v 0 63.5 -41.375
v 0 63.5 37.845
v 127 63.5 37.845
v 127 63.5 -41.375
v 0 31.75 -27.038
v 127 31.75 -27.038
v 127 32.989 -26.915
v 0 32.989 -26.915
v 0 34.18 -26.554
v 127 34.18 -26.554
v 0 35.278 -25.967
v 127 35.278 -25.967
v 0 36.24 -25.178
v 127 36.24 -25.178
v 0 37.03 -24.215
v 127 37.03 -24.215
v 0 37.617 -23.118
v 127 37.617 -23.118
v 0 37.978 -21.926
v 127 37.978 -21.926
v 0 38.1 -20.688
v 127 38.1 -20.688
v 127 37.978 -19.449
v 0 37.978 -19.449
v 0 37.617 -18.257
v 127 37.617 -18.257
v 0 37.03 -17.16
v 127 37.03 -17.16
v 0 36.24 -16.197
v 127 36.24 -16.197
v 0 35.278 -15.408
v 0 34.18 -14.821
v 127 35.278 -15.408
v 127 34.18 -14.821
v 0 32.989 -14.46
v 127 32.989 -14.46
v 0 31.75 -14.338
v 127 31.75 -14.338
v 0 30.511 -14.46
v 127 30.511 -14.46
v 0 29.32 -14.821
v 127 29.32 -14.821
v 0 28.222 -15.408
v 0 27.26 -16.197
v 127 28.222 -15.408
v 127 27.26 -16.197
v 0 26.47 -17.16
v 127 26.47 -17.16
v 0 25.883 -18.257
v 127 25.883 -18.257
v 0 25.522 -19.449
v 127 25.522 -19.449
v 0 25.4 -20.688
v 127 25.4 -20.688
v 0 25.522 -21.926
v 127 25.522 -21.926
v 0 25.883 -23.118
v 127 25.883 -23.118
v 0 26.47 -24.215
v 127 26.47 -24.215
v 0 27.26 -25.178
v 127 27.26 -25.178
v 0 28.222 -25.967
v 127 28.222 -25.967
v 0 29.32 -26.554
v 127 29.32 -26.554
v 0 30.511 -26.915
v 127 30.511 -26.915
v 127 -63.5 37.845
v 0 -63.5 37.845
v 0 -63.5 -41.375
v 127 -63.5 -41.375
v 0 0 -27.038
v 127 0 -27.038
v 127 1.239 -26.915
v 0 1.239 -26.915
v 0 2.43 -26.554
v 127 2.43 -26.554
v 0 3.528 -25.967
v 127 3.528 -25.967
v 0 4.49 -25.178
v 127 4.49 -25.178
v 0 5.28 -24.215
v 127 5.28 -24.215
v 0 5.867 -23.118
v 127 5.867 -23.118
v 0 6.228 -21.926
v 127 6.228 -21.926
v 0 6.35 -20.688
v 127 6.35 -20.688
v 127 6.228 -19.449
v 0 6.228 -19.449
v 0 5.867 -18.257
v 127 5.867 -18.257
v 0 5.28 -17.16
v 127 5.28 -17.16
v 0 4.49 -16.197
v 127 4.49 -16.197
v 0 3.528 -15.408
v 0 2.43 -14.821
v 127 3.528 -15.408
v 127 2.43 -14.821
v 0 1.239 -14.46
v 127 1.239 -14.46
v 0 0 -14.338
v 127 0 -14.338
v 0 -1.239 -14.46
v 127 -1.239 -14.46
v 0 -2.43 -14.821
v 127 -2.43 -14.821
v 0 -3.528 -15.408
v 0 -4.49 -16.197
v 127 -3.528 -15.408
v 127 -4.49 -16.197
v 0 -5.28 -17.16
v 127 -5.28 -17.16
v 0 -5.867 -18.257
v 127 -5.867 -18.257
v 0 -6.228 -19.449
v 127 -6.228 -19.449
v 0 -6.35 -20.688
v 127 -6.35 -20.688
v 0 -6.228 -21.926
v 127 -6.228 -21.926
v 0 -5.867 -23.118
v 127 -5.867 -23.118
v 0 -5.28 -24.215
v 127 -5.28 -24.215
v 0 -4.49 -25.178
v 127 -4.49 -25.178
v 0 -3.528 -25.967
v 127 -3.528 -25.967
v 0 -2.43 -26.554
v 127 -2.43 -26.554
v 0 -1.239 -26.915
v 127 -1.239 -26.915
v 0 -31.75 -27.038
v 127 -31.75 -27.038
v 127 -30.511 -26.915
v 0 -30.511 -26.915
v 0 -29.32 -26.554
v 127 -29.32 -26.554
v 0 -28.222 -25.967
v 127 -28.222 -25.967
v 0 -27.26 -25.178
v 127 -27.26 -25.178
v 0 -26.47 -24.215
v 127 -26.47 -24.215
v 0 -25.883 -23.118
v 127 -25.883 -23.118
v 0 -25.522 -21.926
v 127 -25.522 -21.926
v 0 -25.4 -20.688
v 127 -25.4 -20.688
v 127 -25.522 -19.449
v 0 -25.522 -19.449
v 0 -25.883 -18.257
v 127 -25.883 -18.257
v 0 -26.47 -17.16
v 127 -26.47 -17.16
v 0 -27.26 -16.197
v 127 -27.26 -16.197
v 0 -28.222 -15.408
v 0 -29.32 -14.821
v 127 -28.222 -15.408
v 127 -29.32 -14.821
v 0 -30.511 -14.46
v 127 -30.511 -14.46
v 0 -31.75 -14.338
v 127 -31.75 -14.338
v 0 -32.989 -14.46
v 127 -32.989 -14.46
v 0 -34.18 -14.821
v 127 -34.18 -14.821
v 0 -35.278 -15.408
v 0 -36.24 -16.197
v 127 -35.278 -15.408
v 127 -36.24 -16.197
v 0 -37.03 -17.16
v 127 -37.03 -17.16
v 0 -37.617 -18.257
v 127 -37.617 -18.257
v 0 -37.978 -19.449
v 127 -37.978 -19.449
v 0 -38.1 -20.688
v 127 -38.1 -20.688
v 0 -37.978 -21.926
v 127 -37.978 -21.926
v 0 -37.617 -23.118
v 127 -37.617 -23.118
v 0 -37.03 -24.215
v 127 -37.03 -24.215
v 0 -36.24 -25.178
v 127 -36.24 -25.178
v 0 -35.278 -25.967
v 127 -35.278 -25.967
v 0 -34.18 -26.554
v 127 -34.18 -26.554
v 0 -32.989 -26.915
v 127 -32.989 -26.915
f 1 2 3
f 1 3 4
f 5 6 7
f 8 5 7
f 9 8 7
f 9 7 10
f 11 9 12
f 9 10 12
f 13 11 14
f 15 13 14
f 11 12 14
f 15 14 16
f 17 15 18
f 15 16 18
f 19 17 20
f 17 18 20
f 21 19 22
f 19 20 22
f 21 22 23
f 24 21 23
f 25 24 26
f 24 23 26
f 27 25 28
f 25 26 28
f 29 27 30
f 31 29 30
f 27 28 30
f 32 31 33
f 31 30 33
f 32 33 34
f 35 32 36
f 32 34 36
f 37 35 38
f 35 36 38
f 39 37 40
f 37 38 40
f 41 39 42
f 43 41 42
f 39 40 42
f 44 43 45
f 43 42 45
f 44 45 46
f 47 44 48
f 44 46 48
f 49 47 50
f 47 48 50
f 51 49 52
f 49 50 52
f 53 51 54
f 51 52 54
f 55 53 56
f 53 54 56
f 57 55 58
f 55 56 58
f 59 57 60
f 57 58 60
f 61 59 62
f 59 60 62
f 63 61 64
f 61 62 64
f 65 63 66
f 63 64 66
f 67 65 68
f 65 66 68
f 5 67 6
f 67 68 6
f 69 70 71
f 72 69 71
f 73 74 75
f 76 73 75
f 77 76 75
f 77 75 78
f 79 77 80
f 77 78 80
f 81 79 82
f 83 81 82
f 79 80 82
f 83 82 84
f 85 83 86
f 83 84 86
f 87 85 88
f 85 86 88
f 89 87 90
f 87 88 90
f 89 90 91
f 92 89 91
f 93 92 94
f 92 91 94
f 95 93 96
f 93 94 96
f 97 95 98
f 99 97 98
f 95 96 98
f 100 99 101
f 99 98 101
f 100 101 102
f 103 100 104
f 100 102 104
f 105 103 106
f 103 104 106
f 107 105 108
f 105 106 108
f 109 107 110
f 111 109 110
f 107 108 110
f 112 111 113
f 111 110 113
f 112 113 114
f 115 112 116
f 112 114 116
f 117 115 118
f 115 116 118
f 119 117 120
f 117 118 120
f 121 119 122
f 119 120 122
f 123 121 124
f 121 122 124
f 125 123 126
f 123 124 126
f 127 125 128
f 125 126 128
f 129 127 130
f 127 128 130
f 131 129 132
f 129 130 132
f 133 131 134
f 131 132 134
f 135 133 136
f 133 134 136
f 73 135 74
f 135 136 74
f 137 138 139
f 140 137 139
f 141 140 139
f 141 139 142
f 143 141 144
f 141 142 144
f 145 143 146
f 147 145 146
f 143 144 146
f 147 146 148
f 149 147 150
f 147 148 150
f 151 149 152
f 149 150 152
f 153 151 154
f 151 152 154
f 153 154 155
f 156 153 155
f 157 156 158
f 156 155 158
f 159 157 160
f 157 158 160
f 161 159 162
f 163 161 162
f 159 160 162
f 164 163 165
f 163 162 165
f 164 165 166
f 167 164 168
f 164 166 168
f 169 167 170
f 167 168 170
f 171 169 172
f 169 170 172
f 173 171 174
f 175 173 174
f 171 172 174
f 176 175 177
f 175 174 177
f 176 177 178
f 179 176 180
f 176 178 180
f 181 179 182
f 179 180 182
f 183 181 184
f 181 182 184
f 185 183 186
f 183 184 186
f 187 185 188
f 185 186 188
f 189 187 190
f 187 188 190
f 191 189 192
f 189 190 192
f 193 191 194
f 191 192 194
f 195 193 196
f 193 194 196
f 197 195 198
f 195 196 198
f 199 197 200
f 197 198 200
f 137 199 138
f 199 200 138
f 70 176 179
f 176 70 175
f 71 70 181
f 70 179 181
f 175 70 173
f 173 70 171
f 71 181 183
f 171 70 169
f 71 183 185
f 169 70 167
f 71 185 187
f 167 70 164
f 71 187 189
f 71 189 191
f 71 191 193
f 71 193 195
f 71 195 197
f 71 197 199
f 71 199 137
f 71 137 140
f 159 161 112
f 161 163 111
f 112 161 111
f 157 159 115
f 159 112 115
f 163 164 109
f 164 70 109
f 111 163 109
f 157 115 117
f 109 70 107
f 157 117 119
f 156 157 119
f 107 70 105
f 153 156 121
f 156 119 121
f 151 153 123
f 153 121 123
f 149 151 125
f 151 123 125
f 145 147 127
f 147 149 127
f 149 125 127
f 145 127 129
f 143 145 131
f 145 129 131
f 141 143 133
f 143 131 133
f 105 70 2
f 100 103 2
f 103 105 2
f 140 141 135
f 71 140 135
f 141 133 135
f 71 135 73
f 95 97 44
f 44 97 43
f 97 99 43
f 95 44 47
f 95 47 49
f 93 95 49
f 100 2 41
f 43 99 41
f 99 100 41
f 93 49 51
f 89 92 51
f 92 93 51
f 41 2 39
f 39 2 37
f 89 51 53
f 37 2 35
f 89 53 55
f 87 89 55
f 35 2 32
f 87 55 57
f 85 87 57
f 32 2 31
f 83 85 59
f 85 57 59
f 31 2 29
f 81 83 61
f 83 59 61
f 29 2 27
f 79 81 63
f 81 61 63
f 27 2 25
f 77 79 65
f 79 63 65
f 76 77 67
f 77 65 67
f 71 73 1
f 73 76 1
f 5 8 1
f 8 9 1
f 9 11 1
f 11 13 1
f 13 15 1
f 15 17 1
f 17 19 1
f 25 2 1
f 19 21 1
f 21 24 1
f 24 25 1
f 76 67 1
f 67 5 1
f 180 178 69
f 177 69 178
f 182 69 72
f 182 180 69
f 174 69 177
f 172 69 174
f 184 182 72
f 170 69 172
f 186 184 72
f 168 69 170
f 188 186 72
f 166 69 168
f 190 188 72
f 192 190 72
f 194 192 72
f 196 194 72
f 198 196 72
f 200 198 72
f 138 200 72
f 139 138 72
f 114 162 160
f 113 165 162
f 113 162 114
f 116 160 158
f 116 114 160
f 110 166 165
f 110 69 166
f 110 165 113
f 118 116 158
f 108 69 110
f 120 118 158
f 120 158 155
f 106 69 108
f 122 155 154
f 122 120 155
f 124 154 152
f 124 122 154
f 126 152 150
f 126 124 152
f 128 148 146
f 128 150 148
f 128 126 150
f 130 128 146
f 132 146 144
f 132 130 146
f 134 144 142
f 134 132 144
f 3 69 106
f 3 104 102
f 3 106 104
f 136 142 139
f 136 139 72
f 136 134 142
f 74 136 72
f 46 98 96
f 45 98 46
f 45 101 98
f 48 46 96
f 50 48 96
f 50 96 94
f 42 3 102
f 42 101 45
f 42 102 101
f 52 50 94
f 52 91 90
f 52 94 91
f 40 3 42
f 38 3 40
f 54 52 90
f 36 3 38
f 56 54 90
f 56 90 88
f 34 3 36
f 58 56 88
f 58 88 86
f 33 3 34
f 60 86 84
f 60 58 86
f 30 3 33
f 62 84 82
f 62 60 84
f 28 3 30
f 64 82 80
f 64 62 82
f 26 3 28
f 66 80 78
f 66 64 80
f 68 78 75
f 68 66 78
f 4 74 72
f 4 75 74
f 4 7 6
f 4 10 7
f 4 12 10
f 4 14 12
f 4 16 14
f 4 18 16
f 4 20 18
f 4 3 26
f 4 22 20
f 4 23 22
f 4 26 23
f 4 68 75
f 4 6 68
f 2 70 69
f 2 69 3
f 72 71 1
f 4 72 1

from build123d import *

# Parameters (mm, degrees)
SKETCH1_W               = 82.75
SKETCH1_H               = 127
BOSS_EXTRUDE1_DEPTH     = 127
SKETCH2_R               = 6.35
CUT_EXTRUDE1_DEPTH      = 1
CUT_EXTRUDE1_DEPTH_BACK = 127
SKETCH3_W               = 28.753041512
SKETCH3_H               = 129.689601996
CUT_EXTRUDE2_DEPTH      = 127
SKETCH6_W               = 3.210142998
SKETCH6_H               = 200
CUT_EXTRUDE3_DEPTH      = 128


with BuildPart() as part:
    # Sketch1 → Boss-Extrude1 (new body)
    with BuildSketch(Plane(origin=(0, 0, 0), x_dir=(0, 0, -1), z_dir=(1, 0, 0))):
        Rectangle(SKETCH1_W, SKETCH1_H)
    extrude(amount=BOSS_EXTRUDE1_DEPTH)

    # Sketch2 → Cut-Extrude1 (cut, two sides)
    with BuildSketch(Plane(origin=(127, 0, 0), x_dir=(0, 0, -1), z_dir=(1, 0, 0))) as cut_extrude1_sk:
        with Locations((20.6875, 31.75)):
            Circle(SKETCH2_R)
        with Locations((20.6875, -31.75)):
            Circle(SKETCH2_R)
        with Locations((20.6875, 0)):
            Circle(SKETCH2_R)
    extrude(amount=CUT_EXTRUDE1_DEPTH, mode=Mode.SUBTRACT)
    extrude(cut_extrude1_sk.sketch, amount=-CUT_EXTRUDE1_DEPTH_BACK, mode=Mode.SUBTRACT)

    # Sketch3 → Cut-Extrude2 (cut)
    with BuildSketch(Plane(origin=(127, 0, 0), x_dir=(0, 0, -1), z_dir=(1, 0, 0))):
        with Locations((-53.011520756, -1.344800998)):
            Rectangle(SKETCH3_W, SKETCH3_H)
    extrude(amount=-CUT_EXTRUDE2_DEPTH, mode=Mode.SUBTRACT)

    # Sketch6 → Cut-Extrude3 (cut, through all)
    with BuildSketch(Plane(origin=(127, 0, 0), x_dir=(0, 0, -1), z_dir=(1, 0, 0))):
        with Locations((-39.450071499, -36.5)):
            Rectangle(SKETCH6_W, SKETCH6_H)
    extrude(amount=-CUT_EXTRUDE3_DEPTH, mode=Mode.SUBTRACT)


solid = part.part
